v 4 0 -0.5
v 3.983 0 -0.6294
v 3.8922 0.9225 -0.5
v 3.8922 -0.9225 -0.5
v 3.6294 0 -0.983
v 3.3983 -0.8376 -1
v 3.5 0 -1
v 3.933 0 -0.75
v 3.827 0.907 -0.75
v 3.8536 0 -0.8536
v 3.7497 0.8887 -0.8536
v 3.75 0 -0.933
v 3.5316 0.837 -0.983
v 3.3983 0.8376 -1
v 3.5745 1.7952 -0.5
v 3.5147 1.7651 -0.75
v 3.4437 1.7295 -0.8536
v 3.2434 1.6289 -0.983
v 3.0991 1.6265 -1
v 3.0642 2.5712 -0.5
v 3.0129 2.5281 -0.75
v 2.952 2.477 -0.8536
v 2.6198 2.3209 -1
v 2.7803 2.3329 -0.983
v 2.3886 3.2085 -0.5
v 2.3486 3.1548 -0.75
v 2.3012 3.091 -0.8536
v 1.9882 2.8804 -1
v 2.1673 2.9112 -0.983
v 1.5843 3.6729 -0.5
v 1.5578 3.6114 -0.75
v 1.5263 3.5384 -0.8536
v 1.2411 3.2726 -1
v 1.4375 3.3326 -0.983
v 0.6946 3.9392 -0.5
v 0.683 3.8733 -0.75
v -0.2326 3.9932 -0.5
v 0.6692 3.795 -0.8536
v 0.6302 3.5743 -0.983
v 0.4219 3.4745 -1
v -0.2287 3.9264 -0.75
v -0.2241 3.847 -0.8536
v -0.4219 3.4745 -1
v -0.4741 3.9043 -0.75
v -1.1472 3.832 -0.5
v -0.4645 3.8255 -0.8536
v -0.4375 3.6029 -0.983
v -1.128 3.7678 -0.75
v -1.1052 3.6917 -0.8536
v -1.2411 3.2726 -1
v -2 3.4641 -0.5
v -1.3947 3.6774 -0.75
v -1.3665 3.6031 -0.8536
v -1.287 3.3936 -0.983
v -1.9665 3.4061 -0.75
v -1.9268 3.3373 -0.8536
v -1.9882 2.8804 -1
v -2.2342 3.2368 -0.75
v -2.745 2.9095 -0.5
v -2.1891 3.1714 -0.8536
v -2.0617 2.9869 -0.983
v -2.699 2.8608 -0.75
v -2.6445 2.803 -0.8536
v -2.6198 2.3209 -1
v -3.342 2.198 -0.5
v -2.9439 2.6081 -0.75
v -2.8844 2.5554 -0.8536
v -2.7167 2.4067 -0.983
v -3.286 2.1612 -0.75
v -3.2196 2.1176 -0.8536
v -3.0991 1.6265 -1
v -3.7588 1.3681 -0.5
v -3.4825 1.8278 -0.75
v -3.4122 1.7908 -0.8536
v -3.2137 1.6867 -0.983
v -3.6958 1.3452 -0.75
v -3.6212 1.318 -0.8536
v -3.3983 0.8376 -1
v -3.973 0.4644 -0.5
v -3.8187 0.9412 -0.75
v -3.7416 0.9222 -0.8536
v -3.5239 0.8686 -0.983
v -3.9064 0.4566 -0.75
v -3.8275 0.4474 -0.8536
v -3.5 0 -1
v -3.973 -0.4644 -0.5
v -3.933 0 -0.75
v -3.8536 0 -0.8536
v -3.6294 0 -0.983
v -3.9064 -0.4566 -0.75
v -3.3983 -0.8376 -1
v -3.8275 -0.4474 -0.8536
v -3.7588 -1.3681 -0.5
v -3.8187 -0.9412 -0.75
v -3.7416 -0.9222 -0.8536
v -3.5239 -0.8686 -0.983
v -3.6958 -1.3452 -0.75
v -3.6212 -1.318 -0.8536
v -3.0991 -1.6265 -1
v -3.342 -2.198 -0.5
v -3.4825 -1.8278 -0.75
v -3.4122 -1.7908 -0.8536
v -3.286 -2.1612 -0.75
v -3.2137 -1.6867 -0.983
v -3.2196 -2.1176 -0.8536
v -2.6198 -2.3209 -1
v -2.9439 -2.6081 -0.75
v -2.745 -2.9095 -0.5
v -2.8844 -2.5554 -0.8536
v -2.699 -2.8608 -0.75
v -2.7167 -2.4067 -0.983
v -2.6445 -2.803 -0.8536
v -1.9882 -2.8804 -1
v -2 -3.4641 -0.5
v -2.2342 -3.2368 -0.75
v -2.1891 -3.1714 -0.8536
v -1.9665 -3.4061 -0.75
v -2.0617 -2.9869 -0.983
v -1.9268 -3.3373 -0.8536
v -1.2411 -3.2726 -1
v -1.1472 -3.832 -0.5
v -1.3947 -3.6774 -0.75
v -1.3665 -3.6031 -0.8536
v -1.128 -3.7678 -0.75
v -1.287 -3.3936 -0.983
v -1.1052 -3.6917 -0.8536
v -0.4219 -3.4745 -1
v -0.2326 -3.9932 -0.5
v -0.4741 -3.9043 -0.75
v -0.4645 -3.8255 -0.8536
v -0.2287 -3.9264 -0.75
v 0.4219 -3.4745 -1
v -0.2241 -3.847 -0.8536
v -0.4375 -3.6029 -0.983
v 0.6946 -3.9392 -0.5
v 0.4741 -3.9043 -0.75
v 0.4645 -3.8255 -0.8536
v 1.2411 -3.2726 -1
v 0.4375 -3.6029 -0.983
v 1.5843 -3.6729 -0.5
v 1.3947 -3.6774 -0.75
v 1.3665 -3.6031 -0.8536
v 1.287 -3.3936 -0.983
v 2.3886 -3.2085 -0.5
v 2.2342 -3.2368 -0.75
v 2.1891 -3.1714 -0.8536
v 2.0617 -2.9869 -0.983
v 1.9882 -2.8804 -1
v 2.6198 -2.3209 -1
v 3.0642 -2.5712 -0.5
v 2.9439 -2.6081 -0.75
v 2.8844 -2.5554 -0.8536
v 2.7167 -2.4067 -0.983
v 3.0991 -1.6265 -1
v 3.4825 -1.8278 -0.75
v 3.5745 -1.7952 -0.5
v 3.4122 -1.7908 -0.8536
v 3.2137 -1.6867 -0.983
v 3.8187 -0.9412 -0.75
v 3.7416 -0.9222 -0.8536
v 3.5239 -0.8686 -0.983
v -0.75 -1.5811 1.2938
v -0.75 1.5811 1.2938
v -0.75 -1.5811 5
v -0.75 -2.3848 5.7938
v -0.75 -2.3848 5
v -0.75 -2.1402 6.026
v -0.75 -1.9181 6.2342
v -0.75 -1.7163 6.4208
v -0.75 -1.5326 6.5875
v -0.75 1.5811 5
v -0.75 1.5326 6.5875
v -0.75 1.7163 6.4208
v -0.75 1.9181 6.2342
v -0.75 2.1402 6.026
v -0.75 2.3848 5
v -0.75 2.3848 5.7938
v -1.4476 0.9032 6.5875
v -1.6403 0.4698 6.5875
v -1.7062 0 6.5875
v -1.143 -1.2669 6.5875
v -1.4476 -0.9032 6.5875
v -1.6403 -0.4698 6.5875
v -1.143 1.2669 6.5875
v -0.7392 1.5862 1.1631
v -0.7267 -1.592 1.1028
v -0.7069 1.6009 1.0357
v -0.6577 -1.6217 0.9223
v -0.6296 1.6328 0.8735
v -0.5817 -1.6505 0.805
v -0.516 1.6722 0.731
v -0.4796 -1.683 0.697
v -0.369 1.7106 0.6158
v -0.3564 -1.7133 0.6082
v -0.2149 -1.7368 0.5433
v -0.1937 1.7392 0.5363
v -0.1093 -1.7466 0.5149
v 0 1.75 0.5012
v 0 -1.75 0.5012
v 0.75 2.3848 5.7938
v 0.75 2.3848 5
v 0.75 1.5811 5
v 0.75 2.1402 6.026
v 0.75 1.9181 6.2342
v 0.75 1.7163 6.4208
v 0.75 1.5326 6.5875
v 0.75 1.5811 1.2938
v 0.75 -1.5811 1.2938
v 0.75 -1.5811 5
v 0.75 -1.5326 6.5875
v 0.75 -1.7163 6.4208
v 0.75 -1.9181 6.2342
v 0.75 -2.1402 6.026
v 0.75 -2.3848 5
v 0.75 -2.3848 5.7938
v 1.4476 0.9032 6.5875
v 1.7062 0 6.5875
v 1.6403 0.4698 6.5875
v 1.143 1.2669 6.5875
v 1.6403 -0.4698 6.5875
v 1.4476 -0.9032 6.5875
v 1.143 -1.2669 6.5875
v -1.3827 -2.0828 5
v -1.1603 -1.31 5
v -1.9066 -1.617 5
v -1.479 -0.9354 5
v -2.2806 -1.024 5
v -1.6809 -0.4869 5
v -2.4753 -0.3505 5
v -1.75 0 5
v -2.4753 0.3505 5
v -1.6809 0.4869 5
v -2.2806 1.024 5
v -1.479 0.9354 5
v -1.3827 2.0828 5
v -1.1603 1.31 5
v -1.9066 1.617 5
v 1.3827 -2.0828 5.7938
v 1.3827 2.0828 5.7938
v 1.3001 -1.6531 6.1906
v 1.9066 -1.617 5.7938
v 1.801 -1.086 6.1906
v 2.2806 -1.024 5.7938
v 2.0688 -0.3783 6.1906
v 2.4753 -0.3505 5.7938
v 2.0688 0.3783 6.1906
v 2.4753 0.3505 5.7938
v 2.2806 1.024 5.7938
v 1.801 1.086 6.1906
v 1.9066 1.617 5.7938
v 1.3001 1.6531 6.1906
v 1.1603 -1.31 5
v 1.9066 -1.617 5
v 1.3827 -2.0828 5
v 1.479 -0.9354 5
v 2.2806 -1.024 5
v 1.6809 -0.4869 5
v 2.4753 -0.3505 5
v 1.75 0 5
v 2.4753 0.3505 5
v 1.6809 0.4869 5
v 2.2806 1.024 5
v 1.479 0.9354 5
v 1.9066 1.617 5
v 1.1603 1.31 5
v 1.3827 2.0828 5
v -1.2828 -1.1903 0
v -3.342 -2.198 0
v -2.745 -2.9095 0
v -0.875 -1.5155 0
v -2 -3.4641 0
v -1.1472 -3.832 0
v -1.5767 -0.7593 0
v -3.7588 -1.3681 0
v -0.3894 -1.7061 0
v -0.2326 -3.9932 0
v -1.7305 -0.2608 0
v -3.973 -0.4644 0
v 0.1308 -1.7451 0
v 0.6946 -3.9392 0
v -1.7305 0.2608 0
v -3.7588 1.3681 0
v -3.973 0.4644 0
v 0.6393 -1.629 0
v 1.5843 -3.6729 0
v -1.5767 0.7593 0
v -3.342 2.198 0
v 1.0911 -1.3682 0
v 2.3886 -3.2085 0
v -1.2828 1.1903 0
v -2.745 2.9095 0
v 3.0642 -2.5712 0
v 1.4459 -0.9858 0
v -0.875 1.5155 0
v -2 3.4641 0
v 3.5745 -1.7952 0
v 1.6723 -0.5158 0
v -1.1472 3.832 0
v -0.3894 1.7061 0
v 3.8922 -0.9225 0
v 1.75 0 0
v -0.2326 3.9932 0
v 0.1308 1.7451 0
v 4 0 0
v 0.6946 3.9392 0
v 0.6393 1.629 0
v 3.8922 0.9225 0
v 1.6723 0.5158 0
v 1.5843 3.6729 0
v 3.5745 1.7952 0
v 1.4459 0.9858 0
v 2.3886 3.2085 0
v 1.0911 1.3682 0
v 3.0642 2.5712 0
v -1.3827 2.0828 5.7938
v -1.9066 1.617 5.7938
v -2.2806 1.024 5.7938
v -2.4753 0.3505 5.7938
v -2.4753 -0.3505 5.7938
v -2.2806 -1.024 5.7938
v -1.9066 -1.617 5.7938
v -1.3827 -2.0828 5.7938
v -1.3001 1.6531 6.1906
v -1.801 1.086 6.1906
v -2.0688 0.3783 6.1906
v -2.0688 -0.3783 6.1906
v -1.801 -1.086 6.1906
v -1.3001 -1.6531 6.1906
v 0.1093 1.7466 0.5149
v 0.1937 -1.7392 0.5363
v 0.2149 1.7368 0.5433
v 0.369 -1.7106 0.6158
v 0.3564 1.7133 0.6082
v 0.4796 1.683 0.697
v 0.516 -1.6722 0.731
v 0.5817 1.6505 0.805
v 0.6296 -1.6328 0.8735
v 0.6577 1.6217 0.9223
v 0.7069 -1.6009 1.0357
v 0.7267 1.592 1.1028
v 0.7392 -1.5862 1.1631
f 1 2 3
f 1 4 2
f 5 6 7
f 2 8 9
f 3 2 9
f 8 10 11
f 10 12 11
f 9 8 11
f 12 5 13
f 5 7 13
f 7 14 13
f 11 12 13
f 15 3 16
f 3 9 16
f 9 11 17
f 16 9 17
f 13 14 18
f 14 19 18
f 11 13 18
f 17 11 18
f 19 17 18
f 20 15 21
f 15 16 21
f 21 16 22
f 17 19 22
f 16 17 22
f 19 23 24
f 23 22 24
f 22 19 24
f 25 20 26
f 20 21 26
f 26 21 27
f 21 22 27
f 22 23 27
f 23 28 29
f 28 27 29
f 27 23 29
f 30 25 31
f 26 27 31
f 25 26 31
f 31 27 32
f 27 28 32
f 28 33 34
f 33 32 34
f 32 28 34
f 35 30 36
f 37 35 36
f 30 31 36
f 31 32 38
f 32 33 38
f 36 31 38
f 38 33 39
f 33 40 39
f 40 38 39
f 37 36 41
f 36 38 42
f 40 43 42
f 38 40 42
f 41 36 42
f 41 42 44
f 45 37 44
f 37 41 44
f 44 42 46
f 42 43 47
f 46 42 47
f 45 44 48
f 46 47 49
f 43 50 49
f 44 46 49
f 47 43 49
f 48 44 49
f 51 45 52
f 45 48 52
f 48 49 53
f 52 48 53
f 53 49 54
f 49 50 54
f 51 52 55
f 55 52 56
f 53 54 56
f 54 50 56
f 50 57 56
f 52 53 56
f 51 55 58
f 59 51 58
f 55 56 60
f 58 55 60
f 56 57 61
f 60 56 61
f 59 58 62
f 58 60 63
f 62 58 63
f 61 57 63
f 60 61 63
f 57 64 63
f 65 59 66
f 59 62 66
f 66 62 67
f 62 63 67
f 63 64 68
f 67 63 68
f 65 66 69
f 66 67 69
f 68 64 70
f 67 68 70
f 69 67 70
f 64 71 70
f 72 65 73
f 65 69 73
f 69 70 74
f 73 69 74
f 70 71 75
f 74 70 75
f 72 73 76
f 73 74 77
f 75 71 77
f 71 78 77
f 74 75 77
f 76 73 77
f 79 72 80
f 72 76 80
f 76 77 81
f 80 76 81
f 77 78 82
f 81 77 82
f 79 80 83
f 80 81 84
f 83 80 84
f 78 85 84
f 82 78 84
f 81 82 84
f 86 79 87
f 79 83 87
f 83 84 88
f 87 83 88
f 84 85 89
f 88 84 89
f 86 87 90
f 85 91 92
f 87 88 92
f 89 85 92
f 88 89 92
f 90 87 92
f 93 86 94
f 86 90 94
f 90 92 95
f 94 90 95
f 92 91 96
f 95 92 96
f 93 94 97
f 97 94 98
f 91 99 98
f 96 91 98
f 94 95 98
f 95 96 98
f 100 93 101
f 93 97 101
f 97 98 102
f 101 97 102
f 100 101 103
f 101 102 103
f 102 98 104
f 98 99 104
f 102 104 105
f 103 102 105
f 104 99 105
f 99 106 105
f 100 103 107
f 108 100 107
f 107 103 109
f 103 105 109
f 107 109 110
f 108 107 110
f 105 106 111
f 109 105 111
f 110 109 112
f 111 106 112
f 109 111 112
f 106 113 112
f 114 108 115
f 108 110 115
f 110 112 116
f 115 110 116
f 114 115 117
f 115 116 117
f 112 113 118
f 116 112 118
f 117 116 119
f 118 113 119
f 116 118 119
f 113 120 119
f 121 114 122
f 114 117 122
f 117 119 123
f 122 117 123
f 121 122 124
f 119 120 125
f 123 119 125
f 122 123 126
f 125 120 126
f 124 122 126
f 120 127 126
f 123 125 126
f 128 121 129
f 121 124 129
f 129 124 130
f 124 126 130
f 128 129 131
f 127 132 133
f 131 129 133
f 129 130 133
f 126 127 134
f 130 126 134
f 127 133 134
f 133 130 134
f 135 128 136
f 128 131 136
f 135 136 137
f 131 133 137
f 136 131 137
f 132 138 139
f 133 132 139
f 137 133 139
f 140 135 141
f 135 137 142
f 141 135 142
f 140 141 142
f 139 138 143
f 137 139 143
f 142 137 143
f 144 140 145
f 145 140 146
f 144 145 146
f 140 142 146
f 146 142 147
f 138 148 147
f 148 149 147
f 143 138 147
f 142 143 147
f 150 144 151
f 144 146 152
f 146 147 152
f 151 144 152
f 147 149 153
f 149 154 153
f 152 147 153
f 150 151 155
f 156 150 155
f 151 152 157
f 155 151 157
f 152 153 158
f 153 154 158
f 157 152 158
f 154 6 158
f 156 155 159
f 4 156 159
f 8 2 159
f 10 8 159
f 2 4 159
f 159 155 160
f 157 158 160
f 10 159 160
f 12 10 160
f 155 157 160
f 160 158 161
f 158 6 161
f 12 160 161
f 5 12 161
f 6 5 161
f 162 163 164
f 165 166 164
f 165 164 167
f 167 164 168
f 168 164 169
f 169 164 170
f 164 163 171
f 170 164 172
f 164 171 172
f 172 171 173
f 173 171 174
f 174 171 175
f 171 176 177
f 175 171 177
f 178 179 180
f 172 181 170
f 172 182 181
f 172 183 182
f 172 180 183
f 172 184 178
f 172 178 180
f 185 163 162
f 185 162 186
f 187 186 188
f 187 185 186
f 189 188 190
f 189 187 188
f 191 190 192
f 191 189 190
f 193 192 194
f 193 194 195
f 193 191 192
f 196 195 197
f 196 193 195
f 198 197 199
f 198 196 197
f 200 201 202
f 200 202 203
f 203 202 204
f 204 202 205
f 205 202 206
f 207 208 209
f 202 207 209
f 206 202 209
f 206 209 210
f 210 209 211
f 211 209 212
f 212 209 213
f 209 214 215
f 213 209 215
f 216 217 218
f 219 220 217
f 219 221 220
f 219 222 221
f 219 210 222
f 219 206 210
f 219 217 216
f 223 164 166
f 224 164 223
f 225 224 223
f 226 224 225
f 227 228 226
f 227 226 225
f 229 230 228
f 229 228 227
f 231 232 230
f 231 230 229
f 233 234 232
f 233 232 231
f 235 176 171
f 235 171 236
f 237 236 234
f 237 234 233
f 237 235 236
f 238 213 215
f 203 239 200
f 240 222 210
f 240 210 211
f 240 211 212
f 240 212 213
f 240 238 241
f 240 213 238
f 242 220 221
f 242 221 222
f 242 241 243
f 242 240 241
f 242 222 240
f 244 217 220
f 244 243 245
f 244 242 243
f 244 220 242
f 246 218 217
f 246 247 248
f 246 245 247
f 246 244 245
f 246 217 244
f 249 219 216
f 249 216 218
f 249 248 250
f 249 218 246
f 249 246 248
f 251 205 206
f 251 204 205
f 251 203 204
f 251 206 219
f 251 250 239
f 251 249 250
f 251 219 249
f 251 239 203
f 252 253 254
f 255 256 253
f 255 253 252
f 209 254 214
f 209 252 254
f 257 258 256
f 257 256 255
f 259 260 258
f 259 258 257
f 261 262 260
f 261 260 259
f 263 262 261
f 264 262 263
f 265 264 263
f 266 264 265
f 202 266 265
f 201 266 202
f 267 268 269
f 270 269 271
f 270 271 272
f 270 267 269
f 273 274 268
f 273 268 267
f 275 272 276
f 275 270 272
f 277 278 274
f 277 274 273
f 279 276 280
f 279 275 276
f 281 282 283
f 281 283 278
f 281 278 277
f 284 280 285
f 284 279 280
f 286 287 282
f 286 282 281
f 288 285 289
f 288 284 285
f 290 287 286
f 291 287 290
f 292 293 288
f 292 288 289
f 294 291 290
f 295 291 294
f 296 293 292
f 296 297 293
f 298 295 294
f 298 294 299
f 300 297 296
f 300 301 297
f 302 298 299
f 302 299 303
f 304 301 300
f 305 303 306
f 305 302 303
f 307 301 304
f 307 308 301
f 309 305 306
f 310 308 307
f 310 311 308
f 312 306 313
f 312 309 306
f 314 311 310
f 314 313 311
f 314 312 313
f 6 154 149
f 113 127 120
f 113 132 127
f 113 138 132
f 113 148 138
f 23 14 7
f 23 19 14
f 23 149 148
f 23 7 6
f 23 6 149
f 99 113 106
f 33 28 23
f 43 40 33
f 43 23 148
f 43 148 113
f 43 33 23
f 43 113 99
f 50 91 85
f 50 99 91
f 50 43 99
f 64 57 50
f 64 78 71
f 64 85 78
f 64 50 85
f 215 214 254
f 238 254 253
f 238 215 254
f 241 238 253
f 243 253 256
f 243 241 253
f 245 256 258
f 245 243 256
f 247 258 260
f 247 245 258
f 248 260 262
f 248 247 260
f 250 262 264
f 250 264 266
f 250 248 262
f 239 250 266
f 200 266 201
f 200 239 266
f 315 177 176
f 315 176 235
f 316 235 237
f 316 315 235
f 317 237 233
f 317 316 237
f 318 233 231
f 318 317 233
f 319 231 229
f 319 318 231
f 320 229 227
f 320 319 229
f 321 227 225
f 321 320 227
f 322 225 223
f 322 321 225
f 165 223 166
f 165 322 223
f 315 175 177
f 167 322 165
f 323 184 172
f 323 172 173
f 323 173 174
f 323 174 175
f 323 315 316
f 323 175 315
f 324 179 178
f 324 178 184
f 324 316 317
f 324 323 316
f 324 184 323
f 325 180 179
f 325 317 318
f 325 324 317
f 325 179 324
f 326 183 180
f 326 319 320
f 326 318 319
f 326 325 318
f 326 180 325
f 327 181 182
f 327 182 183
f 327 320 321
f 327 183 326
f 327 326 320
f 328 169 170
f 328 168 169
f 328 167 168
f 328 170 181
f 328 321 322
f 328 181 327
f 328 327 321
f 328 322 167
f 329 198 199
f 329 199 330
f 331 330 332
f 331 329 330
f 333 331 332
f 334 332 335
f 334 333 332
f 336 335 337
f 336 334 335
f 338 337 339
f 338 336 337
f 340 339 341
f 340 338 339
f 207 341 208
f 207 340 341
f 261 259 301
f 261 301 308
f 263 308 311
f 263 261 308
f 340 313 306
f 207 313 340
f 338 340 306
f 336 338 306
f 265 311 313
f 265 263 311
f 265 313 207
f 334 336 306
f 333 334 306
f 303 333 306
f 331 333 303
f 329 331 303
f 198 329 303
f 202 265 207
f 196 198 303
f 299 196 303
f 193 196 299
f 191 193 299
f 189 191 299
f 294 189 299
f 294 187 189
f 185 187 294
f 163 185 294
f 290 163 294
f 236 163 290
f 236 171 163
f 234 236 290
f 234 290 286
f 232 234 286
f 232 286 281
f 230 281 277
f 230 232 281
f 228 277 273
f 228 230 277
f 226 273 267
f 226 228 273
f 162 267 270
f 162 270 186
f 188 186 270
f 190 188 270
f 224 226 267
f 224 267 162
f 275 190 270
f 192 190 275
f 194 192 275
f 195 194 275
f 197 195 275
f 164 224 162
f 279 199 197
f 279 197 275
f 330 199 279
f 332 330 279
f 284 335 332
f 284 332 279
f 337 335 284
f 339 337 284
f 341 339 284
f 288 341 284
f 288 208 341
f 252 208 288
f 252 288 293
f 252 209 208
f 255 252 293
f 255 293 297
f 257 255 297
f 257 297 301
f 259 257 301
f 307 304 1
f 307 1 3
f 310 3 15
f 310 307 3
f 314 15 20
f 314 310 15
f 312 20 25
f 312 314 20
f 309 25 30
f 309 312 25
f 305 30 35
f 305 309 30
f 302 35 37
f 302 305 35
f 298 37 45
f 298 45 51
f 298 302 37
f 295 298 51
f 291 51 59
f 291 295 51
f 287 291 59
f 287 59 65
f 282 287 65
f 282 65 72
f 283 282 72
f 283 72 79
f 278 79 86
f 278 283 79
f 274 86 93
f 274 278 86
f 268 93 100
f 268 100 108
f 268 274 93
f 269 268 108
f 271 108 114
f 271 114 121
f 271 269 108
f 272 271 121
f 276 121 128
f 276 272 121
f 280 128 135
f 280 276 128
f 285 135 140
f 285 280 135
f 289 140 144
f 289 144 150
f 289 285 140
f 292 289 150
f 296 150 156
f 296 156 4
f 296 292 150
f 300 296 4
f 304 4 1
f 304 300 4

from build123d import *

# Parameters (mm, degrees)
F2_SIZE       = 0.79375
F3_W          = 1.5
F3_H          = 6.0875
F4_DEPTH      = 4.001
F4_DEPTH_BACK = 4.001
F5_T4_DEPTH   = 7.1310276602
F5_S5_R       = 1.75
F5_T6_DEPTH   = 5
F5_T10_DEPTH  = 7.1310276602
F5_S11_R      = 1.75
F5_T12_DEPTH  = 5
F6_R          = 0.5


# Not quite as in the source:
# - a fillet or chamfer that OpenCascade refuses, or shapes differently, is made with other operations: its cross-section is extruded or revolved along the edge and cut away or added


with BuildPart() as f1:
    # F0 (on Front) → F1 (revolve)
    with BuildSketch(Plane.XZ):
        Polygon((4, 0), (1.75, 0), (1.75, 5), (2.5, 5), (2.5, 6.5875), (0, 6.5875), (0, 5), (0, 0), (0, -1), (4, -1), align=None)
    revolve(axis=Axis((0, 0, 2.5), (0, 0, 1)))

    # F2
    f2_edges = [f1.edges().sort_by_distance(p)[0] for p in [
        (-2.5, 0, 6.5875),
    ]]
    chamfer(f2_edges, length=F2_SIZE)

    # F3 (on Front) → F4 (cut, two sides)
    with BuildSketch(Plane.XZ) as f4_sk:
        with Locations((0, 3.54375)):
            Rectangle(F3_W, F3_H)
    extrude(amount=F4_DEPTH, mode=Mode.SUBTRACT)
    extrude(f4_sk.sketch, amount=-F4_DEPTH_BACK, mode=Mode.SUBTRACT)

    # F5: fillet of radius 0.79375 on 2 edges, made by hand


with BuildPart() as f5_tool2:
    # F5_s3 → F5_t4 (new body)
    with BuildSketch(Plane.XZ.offset(-3.5655138301)):
        with BuildLine():
            ThreePointArc((-0.04375, 0.5), (0.5175160076, 0.7324839924), (0.75, 1.29375))
            Line((0.75, 1.29375), (0.75, 0.5))
            Line((0.75, 0.5), (-0.04375, 0.5))
        make_face()
    extrude(amount=F5_T4_DEPTH)

    # F5_s5 → F5_t6 (intersect, symmetric)
    with BuildSketch(Plane.XY.offset(0.9)):
        Circle(F5_S5_R)
    extrude(amount=F5_T6_DEPTH, both=True, mode=Mode.INTERSECT)


with BuildPart() as f1_1:
    add(f1.part)

    # F5_t1: union F5_tool2
    add(f5_tool2.part)


with BuildPart() as f5_tool8:
    # F5_s9 → F5_t10 (new body)
    with BuildSketch(Plane.XZ.offset(-3.5655138301)):
        with BuildLine():
            ThreePointArc((-0.75, 1.29375), (-0.5175160076, 0.7324839924), (0.04375, 0.5))
            Line((0.04375, 0.5), (-0.75, 0.5))
            Line((-0.75, 0.5), (-0.75, 1.29375))
        make_face()
    extrude(amount=F5_T10_DEPTH)

    # F5_s11 → F5_t12 (intersect, symmetric)
    with BuildSketch(Plane.XY.offset(0.9)):
        Circle(F5_S11_R)
    extrude(amount=F5_T12_DEPTH, both=True, mode=Mode.INTERSECT)


with BuildPart() as f1_2:
    add(f1_1.part)

    # F5_t7: union F5_tool8
    add(f5_tool8.part)

    # F6
    f6_edges = [f1_2.edges().sort_by_distance(p)[0] for p in [
        (-4, 0, -1),
    ]]
    fillet(f6_edges, radius=F6_R)


solid = f1_2.part
